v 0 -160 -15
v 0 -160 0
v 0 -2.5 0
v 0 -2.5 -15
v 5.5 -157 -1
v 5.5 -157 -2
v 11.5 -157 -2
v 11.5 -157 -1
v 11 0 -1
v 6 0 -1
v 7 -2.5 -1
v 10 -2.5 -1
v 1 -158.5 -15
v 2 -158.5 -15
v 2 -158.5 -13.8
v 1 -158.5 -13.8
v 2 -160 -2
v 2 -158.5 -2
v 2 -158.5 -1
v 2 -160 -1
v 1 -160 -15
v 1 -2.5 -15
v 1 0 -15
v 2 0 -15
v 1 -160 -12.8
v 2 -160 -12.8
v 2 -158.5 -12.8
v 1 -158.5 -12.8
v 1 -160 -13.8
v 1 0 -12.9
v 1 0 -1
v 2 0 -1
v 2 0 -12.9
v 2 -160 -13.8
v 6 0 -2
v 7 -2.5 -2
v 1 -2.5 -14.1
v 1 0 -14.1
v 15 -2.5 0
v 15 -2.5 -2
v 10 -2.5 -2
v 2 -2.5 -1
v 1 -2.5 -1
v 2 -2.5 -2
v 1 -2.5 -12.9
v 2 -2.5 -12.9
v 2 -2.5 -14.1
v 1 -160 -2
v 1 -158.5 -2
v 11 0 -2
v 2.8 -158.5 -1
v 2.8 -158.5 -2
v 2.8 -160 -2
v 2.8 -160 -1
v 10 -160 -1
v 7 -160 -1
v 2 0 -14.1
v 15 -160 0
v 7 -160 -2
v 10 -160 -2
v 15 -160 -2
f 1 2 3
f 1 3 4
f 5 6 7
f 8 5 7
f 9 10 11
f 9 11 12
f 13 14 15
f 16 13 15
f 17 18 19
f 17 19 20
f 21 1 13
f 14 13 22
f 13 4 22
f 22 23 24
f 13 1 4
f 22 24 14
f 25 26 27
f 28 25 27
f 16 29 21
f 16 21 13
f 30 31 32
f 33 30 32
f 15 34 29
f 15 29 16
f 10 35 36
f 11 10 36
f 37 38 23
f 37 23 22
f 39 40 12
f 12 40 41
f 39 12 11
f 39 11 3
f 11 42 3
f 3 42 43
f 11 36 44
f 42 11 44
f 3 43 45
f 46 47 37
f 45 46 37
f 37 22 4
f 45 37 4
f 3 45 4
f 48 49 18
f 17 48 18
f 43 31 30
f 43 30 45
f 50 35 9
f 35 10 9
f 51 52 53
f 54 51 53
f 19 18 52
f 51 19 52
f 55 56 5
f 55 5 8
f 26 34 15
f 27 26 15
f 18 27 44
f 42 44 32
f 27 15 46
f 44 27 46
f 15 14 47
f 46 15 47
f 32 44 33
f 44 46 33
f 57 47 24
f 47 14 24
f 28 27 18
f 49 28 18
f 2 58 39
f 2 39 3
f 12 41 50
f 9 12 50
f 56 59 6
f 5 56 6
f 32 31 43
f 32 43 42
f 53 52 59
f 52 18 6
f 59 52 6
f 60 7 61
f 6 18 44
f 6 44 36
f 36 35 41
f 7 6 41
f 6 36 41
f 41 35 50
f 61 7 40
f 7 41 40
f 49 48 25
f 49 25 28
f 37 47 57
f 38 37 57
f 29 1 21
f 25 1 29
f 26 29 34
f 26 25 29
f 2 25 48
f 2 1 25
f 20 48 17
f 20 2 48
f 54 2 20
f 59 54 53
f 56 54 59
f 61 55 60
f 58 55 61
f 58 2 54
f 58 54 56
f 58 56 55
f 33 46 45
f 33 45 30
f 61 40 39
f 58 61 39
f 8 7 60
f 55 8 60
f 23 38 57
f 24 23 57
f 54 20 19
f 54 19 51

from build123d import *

# Parameters (mm, degrees)
F0_W      = 2
F0_H      = 13
F1_DEPTH  = 160
F2_W      = 1.5
F2_H      = 1.2
F2_H_2    = 10.8
F3_DEPTH  = 1
F4_W      = 0.8
F4_H      = 1.5
F5_DEPTH  = 1
F7_DEPTH  = 2
F8_W      = 2.5
F8_H      = 1.2
F9_DEPTH  = 1
F10_W     = 11
F10_H     = 2.5
F11_DEPTH = 1
F12_W     = 2.5
F12_H     = 14
F13_DEPTH = 1


with BuildPart() as f1:
    # F0 (on Front) → F1 (new body)
    with BuildSketch(Plane.XZ):
        Polygon((15, 0), (0, 0), (0, -2), (2, -2), (15, -2), align=None)
        with Locations((1, -8.5)):
            Rectangle(F0_W, F0_H)
    extrude(amount=F1_DEPTH)

    # F2 (on face) → F3 (cut)
    with BuildSketch(Plane.YZ.offset(2)):
        with Locations((-159.25, -14.4)):
            Rectangle(F2_W, F2_H)
        with Locations((-159.25, -7.4)):
            Rectangle(F2_W, F2_H_2)
    extrude(amount=-F3_DEPTH, mode=Mode.SUBTRACT)

    # F4 (on face) → F5 (cut)
    with BuildSketch(Plane(origin=(0, 0, -2), x_dir=(1, 0, 0), z_dir=(0, 0, -1))):
        Polygon((11.5, 157), (10, 160), (7, 160), (5.5, 157), align=None)
        with Locations((2.4, 159.25)):
            Rectangle(F4_W, F4_H)
    extrude(amount=-F5_DEPTH, mode=Mode.SUBTRACT)

    # F6 (on face) → F7 (cut)
    with BuildSketch(Plane(origin=(0, 0, -2), x_dir=(1, 0, 0), z_dir=(0, 0, -1))):
        Polygon((10, 2.5), (11, 0), (15, 0), (15, 2.5), align=None)
        Polygon((6, 0), (7, 2.5), (2, 2.5), (2, 0), align=None)
    extrude(amount=-F7_DEPTH, mode=Mode.SUBTRACT)

    # F8 (on face) → F9 (cut)
    with BuildSketch(Plane.YZ.offset(2)):
        with Locations((-1.25, -13.5)):
            Rectangle(F8_W, F8_H)
    extrude(amount=-F9_DEPTH, mode=Mode.SUBTRACT)

    # F10 (on face) → F11 (cut)
    with BuildSketch(Plane.XY):
        with Locations((5.5, -1.25)):
            Rectangle(F10_W, F10_H)
    extrude(amount=-F11_DEPTH, mode=Mode.SUBTRACT)

    # F12 (on face) → F13 (cut)
    with BuildSketch(Plane(origin=(0, 0, 0), x_dir=(0, -1, 0), z_dir=(-1, 0, 0))):
        with Locations((1.25, -8)):
            Rectangle(F12_W, F12_H)
    extrude(amount=-F13_DEPTH, mode=Mode.SUBTRACT)


solid = f1.part
